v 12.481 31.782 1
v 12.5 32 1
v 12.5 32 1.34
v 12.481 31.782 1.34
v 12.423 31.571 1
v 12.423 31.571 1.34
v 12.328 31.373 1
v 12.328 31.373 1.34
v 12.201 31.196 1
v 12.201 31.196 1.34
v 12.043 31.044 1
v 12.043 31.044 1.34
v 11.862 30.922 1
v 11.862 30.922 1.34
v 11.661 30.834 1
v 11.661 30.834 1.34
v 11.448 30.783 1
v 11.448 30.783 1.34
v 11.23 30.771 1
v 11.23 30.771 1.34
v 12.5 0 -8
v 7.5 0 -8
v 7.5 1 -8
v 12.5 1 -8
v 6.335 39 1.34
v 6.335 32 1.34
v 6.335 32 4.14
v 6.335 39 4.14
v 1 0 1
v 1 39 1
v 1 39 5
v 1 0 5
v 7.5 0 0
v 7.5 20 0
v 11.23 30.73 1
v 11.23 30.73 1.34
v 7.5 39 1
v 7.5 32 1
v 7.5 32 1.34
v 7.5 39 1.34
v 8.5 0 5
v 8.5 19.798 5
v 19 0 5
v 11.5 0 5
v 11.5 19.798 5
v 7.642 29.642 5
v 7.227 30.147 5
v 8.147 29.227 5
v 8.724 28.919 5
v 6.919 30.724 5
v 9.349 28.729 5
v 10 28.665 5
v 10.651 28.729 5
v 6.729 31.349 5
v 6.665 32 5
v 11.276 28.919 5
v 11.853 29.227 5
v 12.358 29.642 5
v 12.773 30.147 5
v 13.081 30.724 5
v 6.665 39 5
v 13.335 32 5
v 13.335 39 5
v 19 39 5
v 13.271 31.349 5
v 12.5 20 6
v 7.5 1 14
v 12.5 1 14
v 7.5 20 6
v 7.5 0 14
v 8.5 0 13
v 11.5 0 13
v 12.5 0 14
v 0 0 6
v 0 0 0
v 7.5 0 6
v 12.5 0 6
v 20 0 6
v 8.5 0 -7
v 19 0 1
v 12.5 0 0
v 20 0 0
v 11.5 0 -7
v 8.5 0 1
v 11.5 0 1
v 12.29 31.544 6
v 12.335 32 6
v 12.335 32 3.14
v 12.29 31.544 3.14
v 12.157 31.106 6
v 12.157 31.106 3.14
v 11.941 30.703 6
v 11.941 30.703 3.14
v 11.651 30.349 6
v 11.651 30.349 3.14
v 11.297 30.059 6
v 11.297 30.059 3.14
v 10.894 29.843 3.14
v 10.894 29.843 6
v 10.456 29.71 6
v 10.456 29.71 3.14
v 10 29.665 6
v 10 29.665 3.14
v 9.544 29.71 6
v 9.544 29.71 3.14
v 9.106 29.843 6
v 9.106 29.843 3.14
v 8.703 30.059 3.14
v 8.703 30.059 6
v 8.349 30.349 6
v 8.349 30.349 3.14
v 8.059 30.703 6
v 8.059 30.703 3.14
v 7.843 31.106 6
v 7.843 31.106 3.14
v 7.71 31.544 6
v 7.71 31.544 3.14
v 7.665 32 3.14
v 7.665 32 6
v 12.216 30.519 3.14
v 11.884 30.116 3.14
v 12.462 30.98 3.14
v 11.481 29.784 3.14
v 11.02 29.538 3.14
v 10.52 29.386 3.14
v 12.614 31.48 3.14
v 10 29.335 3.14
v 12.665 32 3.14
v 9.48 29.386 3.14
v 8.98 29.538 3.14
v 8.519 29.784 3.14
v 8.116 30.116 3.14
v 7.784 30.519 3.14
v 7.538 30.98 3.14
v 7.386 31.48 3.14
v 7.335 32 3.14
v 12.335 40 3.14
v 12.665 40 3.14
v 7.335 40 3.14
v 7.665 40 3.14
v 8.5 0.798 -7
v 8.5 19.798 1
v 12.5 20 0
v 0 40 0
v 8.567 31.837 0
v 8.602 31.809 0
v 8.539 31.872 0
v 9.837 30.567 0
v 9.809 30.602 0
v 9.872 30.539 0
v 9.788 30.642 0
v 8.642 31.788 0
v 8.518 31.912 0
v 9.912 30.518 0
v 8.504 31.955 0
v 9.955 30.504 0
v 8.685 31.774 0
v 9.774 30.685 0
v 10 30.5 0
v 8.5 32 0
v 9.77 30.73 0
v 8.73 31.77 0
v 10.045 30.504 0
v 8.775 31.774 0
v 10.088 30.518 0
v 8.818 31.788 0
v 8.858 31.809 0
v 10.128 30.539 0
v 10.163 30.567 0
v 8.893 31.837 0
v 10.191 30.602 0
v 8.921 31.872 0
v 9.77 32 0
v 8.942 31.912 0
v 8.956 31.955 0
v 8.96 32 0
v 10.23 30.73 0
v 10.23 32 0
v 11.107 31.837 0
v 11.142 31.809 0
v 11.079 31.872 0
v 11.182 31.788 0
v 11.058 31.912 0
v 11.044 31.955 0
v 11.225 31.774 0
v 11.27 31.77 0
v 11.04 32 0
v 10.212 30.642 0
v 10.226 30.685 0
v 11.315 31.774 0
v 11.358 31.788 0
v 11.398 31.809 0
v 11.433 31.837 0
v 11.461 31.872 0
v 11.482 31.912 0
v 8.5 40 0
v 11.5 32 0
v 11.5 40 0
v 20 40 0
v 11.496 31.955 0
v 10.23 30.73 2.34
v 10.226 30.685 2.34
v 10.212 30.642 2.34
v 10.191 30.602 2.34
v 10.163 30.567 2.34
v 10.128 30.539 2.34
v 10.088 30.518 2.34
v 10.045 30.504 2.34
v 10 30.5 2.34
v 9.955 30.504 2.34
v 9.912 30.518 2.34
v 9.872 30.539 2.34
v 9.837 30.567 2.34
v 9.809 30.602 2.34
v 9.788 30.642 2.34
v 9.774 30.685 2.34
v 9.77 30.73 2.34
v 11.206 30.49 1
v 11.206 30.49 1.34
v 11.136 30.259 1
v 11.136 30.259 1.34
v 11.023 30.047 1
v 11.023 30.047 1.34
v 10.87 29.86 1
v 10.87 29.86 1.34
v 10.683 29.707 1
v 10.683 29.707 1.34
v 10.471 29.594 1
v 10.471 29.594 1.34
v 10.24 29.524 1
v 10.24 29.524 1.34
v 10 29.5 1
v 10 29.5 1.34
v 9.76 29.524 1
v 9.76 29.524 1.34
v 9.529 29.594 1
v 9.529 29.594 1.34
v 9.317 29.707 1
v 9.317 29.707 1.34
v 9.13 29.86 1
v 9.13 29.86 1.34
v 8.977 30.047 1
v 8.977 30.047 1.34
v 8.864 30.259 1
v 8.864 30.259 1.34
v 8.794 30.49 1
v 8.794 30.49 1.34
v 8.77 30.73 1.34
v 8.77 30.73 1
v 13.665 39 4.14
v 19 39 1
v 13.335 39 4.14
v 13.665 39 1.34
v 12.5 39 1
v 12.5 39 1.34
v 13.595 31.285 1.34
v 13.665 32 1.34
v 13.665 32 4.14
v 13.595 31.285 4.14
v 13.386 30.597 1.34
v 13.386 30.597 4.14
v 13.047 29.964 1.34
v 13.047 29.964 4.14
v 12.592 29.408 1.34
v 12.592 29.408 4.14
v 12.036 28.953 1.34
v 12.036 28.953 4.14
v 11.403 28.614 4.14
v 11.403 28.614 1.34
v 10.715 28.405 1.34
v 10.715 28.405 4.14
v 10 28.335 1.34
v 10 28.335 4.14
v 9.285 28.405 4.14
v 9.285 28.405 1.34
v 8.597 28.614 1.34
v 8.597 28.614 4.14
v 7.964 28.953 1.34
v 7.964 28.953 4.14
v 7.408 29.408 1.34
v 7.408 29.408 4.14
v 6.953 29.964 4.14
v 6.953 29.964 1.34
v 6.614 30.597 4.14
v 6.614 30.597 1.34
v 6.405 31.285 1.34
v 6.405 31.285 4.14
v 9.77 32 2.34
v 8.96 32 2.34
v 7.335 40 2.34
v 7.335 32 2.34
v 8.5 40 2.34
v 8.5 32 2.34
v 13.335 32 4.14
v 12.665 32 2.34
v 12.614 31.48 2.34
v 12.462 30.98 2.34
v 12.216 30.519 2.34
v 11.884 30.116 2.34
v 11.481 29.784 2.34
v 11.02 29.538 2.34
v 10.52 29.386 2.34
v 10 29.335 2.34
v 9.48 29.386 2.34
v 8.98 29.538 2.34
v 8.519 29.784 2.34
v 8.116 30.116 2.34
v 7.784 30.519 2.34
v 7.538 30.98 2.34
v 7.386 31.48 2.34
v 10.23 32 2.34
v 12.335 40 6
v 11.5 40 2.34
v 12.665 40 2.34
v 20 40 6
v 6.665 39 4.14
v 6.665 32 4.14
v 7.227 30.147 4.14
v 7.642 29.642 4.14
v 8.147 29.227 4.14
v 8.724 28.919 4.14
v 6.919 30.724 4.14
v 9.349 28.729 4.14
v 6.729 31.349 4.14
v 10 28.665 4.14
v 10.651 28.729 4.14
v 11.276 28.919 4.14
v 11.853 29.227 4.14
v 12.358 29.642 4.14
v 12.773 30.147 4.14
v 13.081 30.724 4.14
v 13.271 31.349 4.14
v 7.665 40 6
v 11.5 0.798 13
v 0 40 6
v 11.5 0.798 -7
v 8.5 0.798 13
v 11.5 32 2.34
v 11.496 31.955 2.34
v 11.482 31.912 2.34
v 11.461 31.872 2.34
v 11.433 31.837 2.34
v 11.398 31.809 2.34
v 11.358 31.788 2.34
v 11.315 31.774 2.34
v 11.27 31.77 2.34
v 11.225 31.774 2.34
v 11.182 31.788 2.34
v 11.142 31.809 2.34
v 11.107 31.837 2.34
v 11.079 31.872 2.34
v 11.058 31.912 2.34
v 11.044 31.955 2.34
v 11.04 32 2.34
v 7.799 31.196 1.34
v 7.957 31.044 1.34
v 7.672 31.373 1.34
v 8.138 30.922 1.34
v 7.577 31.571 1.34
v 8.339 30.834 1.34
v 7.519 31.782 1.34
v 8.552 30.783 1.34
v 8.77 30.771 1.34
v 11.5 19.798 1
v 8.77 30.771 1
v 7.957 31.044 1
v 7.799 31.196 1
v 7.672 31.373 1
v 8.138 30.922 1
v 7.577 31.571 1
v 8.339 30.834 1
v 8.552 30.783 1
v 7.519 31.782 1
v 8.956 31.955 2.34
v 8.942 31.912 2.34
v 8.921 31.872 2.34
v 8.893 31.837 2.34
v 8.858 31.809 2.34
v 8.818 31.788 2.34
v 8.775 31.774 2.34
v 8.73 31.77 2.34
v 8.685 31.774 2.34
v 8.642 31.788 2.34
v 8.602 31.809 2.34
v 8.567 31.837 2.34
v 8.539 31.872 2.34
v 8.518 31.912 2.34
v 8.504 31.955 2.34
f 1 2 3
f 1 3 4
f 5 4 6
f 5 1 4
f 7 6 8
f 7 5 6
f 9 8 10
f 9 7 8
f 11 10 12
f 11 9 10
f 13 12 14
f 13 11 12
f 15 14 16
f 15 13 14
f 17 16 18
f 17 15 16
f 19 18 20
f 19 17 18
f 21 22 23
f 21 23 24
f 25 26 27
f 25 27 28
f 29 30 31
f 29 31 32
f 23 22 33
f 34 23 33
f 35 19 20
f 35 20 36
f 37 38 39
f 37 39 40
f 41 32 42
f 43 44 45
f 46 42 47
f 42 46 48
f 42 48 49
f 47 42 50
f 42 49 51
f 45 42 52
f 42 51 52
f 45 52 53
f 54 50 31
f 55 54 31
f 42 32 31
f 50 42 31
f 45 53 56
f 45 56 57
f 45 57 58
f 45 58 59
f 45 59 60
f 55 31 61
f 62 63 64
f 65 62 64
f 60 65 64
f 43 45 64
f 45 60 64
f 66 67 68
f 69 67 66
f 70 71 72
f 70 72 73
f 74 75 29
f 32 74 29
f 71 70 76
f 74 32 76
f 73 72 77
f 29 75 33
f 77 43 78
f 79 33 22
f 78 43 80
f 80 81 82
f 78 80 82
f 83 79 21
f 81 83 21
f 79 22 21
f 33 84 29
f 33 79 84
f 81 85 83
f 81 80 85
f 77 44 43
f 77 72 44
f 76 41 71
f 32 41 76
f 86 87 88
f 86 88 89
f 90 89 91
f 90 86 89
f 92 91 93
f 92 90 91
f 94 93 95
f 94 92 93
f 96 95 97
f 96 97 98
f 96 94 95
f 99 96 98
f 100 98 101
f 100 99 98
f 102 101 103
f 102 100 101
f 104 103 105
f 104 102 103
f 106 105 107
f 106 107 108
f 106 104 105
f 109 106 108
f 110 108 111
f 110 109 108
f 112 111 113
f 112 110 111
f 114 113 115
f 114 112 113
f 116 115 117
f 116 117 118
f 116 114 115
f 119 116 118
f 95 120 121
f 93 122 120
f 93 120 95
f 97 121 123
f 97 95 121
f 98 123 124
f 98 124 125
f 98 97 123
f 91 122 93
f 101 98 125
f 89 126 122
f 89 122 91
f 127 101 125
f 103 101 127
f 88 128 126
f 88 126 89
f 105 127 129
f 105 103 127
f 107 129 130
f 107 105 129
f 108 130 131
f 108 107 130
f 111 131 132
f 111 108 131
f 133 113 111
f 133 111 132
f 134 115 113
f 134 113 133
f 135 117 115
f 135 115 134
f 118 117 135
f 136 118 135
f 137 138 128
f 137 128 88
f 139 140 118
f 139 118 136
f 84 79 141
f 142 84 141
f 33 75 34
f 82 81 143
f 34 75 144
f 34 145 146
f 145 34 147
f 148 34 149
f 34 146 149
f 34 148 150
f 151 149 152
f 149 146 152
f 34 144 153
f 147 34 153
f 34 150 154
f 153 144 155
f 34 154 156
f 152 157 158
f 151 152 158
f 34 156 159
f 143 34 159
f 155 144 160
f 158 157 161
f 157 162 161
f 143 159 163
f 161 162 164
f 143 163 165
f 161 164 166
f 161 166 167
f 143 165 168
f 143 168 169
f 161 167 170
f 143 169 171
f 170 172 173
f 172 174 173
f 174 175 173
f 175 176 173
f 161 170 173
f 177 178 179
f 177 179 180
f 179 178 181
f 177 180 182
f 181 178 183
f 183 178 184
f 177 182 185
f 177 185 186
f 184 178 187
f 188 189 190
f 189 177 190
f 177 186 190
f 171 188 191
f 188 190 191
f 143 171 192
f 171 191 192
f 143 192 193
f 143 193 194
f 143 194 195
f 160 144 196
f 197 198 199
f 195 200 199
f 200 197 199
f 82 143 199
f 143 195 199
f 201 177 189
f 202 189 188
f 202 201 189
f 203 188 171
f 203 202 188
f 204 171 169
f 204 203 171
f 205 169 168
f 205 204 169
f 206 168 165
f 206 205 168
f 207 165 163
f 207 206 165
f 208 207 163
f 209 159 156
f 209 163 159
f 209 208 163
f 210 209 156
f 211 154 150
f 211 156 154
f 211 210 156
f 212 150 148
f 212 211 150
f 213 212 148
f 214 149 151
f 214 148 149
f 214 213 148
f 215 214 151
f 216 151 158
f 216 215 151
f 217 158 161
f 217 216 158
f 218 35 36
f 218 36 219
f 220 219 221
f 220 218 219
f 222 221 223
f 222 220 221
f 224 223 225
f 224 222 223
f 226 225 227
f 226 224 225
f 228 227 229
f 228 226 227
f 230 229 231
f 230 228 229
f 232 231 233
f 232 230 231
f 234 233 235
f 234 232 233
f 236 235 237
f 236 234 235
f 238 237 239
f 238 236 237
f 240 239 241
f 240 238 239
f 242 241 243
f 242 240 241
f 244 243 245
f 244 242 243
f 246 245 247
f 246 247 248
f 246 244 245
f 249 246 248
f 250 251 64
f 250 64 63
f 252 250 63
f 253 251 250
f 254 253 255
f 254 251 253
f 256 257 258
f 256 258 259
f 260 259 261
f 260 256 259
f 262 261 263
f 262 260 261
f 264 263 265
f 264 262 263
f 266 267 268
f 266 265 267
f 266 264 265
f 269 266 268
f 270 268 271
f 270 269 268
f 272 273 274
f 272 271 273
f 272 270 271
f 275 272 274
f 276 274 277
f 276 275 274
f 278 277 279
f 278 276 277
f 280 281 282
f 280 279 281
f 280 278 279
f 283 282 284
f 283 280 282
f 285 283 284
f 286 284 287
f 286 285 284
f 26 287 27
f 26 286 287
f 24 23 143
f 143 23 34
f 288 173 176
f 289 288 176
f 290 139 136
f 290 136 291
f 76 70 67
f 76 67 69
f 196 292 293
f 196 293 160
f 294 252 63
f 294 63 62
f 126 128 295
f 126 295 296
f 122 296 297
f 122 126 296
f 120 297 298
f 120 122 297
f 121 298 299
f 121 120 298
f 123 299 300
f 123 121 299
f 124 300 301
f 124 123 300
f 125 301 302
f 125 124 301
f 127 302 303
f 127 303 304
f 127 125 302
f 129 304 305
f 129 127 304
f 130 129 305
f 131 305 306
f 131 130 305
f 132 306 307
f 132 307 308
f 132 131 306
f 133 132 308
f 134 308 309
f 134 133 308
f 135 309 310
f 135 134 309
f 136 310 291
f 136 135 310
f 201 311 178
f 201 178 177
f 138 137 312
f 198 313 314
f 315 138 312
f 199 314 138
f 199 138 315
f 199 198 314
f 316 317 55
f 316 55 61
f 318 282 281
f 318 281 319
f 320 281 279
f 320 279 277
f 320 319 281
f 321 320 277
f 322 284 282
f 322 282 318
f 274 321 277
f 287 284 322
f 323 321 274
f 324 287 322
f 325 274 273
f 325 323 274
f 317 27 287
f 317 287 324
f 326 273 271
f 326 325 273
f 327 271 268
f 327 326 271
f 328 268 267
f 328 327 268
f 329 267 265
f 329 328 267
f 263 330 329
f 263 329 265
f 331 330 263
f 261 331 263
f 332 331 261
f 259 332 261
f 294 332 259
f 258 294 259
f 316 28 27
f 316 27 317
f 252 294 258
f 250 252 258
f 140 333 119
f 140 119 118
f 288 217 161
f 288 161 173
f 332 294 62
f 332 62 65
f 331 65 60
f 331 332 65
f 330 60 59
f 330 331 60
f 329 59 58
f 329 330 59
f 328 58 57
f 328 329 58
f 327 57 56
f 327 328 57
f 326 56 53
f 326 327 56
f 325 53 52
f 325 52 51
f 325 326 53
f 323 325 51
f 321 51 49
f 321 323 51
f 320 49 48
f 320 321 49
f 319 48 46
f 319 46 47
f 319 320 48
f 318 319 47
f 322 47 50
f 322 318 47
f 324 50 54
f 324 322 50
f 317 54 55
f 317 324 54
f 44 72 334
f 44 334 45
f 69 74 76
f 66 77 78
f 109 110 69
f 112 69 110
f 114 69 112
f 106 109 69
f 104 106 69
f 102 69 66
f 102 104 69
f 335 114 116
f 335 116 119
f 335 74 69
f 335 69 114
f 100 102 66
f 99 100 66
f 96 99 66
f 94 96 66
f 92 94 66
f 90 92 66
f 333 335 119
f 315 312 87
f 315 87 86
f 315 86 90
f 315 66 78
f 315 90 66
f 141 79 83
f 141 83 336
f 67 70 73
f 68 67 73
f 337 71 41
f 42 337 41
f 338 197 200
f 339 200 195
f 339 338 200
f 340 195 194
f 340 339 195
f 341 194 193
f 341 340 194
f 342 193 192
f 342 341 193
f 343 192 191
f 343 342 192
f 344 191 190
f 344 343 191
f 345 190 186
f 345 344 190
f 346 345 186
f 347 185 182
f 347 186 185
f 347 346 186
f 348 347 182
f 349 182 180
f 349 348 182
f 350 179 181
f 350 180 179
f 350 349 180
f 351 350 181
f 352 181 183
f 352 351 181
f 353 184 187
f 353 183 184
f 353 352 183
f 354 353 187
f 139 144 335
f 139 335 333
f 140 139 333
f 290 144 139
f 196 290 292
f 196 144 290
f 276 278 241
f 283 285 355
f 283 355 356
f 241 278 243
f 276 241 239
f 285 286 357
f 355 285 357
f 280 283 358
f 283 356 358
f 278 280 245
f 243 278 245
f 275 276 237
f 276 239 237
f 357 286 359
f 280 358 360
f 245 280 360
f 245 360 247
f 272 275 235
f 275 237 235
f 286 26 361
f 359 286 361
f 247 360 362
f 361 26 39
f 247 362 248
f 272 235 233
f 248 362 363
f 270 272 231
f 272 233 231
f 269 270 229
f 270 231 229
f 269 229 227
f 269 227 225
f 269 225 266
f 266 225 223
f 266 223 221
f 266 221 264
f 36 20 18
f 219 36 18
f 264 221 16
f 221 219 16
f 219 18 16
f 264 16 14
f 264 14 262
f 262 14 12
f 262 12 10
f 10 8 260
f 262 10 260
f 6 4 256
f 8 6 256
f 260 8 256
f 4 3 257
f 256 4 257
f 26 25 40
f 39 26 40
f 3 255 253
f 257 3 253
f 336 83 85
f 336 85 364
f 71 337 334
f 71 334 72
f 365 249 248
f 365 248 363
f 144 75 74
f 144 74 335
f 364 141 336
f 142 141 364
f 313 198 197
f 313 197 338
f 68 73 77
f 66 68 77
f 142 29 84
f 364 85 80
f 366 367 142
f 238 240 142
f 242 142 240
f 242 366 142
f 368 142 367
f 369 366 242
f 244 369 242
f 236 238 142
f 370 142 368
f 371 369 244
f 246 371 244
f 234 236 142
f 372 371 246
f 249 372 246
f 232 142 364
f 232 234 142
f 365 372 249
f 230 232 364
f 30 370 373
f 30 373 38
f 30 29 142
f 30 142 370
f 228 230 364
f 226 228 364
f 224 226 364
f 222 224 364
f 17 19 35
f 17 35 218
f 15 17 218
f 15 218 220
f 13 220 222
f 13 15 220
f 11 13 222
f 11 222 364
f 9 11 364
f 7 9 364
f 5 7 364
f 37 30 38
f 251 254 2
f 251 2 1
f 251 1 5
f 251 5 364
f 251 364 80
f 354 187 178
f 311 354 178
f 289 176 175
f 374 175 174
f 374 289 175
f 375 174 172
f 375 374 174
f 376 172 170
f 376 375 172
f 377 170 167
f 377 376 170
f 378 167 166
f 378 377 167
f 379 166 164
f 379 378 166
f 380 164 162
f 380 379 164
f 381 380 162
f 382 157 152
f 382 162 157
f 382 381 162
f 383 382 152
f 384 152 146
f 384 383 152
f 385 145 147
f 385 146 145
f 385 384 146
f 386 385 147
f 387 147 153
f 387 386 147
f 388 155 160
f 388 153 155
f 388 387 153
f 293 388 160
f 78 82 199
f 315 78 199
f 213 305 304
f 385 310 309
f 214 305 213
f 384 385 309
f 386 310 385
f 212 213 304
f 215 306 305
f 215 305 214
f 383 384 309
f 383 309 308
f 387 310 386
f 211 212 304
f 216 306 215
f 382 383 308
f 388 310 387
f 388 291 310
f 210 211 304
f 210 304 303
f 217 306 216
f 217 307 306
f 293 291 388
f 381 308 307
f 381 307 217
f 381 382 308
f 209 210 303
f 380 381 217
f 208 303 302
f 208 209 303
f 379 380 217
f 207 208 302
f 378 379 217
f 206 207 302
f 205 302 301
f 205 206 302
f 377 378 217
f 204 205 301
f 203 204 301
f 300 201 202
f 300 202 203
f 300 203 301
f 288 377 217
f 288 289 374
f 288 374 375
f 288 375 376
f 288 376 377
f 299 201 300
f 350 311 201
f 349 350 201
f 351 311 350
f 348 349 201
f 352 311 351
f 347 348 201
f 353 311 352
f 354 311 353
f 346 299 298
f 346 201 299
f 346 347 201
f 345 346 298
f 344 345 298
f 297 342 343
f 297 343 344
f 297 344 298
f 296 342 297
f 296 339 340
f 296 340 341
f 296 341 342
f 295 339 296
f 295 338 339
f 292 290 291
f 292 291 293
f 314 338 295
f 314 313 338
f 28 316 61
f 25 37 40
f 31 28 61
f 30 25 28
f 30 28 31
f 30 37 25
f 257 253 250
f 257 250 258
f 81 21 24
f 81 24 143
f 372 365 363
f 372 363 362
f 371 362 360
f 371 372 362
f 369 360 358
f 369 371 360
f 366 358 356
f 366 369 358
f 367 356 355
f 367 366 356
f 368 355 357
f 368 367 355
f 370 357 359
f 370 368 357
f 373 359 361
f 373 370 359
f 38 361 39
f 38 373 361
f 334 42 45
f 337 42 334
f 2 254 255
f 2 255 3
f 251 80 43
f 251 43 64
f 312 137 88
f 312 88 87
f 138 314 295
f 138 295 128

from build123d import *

# Parameters (mm, degrees)
SKETCH1_W           = 20
SKETCH1_H           = 40
BOSS_EXTRUDE1_DEPTH = 6
CUT_EXTRUDE1_DEPTH  = 8
CUT_EXTRUDE2_DEPTH  = 2.86
CUT_EXTRUDE3_DEPTH  = 0.8
CUT_EXTRUDE4_DEPTH  = 45.870876969
SKETCH8_W           = 5
SKETCH8_H           = 8
BOSS_EXTRUDE2_DEPTH = 1
RIB2_REACH          = 44
SKETCH9_WALL_W      = 106.615528128
SKETCH9_WALL_H      = 5
SHELL1_START        = 1
SHELL1_DEPTH        = 4
SHELL1_2_DEPTH      = 0.34
SHELL1_START_2      = 4.14
SHELL1_3_DEPTH      = 0.86
SHELL1_START_3      = 8.5
SHELL1_4_DEPTH      = 3


with BuildPart() as part:
    # Sketch1 → Boss-Extrude1 (new body)
    with BuildSketch(Plane.XY):
        with Locations((10, 20)):
            Rectangle(SKETCH1_W, SKETCH1_H)
    extrude(amount=BOSS_EXTRUDE1_DEPTH)

    # Sketch2 → Cut-Extrude1 (cut)
    with BuildSketch(Plane(origin=(0, 40, 0), x_dir=(1, 0, 0), z_dir=(0, 1, 0))):
        Polygon((12.665, -2.34), (12.665, -3.14), (12.335, -3.14), (12.335, -6), (7.665, -6), (7.665, -3.14), (7.335, -3.14), (7.335, -2.34), (8.5, -2.34), (8.5, 0), (11.5, 0), (11.5, -2.34), align=None)
    extrude(amount=-CUT_EXTRUDE1_DEPTH, mode=Mode.SUBTRACT)

    # Sketch3 → Cut-Extrude2 (cut)
    with BuildSketch(Plane.XY.offset(6)):
        with BuildLine():
            Line((7.665, 32), (12.335, 32))
            ThreePointArc((12.335, 32), (10, 29.665), (7.665, 32))
        make_face()
    extrude(amount=-CUT_EXTRUDE2_DEPTH, mode=Mode.SUBTRACT)

    # Sketch5 → Cut-Extrude3 (cut)
    with BuildSketch(Plane.XY.offset(3.14)):
        with BuildLine():
            Line((7.335, 32), (12.665, 32))
            ThreePointArc((12.665, 32), (10, 29.335), (7.335, 32))
        make_face()
    extrude(amount=-CUT_EXTRUDE3_DEPTH, mode=Mode.SUBTRACT)

    # Sketch7 → Cut-Extrude4 (cut, through all)
    with BuildSketch(Plane.XY.offset(2.34)):
        with BuildLine():
            Line((9.77, 30.73), (9.77, 32))
            Line((9.77, 32), (10.23, 32))
            Line((10.23, 32), (10.23, 30.73))
            ThreePointArc((10.23, 30.73), (10, 30.5), (9.77, 30.73))
        make_face()
        with BuildLine():
            Line((8.5, 32), (8.96, 32))
            ThreePointArc((8.96, 32), (8.73, 31.77), (8.5, 32))
        make_face()
        with BuildLine():
            Line((11.04, 32), (11.5, 32))
            ThreePointArc((11.5, 32), (11.27, 31.77), (11.04, 32))
        make_face()
    extrude(amount=-CUT_EXTRUDE4_DEPTH, mode=Mode.SUBTRACT)

    # Sketch8 → Boss-Extrude2 (add)
    with BuildSketch(Plane.XZ):
        with Locations((10, -4)):
            Rectangle(SKETCH8_W, SKETCH8_H)
    boss_extrude2 = extrude(amount=-BOSS_EXTRUDE2_DEPTH)

    # Sketch9 wall → Rib2 (add, up to next)
    with BuildSketch(Plane(origin=(10, 10.5, -4), x_dir=(0, 0.921635375138, 0.388057000058), z_dir=(0, -0.388057000058, 0.921635375138)), mode=Mode.PRIVATE) as rib2_sk1:
        Rectangle(SKETCH9_WALL_W, SKETCH9_WALL_H)
    rib2_tool1 = extrude(rib2_sk1.sketch, amount=RIB2_REACH, mode=Mode.PRIVATE) - part.part
    rib2 = rib2_tool1.solids().sort_by_distance((10, 10.5, -4))[0]
    add(rib2)

    # Mirror1: Boss-Extrude2, Rib2 across plane
    add(boss_extrude2.mirror(Plane.XY.offset(3)))
    add(rib2.mirror(Plane.XY.offset(3)))

    # Shell1: read off the stored shape, not the designer's step
    # Shell1 outline → Shell1 (cut)
    with BuildSketch(Plane.XY.offset(SHELL1_START)):
        with BuildLine():
            Line((6.335, 32), (6.335, 39))
            Line((6.335, 39), (1, 39))
            Line((1, 39), (1, 0))
            Line((1, 0), (8.5, 0))
            Line((8.5, 0), (11.5, 0))
            Line((11.5, 0), (19, 0))
            Line((19, 0), (19, 39))
            Line((19, 39), (13.665, 39))
            Line((13.665, 39), (13.665, 32))
            ThreePointArc((13.665, 32), (10, 28.335), (6.335, 32))
        make_face()
    extrude(amount=SHELL1_DEPTH, mode=Mode.SUBTRACT)

    # Shell1 2 outline → Shell1 2 (cut)
    with BuildSketch(Plane.XY.offset(SHELL1_START)):
        with BuildLine():
            Line((7.5, 32), (7.5, 39))
            Line((7.5, 39), (6.335, 39))
            Line((6.335, 39), (6.335, 32))
            ThreePointArc((6.335, 32), (10, 28.335), (13.665, 32))
            Line((13.665, 32), (13.665, 39))
            Line((13.665, 39), (12.5, 39))
            Line((12.5, 39), (12.5, 32))
            ThreePointArc((12.5, 32), (12.12548232, 31.116229668), (11.23, 30.770650579))
            Line((11.23, 30.770650579), (11.23, 30.73))
            ThreePointArc((11.23, 30.73), (10, 29.5), (8.77, 30.73))
            Line((8.77, 30.73), (8.77, 30.770650579))
            ThreePointArc((8.77, 30.770650579), (7.87451768, 31.116229668), (7.5, 32))
        make_face()
    extrude(amount=SHELL1_2_DEPTH, mode=Mode.SUBTRACT)

    # Shell1 3 outline → Shell1 3 (cut)
    with BuildSketch(Plane.XY.offset(SHELL1_START_2)):
        with BuildLine():
            Line((6.665, 32), (6.665, 39))
            Line((6.665, 39), (6.335, 39))
            Line((6.335, 39), (6.335, 32))
            ThreePointArc((6.335, 32), (10, 28.335), (13.665, 32))
            Line((13.665, 32), (13.665, 39))
            Line((13.665, 39), (13.335, 39))
            Line((13.335, 39), (13.335, 32))
            ThreePointArc((13.335, 32), (10, 28.665), (6.665, 32))
        make_face()
    extrude(amount=SHELL1_3_DEPTH, mode=Mode.SUBTRACT)

    # Shell1 4 outline → Shell1 4 (cut)
    with BuildSketch(Plane.YZ.offset(SHELL1_START_3)):
        Polygon((0, 1), (0, -7), (0.798058984, -7), (19.798058984, 1), align=None)
        Polygon((0, 13), (0, 5), (19.798058984, 5), (0.798058984, 13), align=None)
    extrude(amount=SHELL1_4_DEPTH, mode=Mode.SUBTRACT)


solid = part.part
